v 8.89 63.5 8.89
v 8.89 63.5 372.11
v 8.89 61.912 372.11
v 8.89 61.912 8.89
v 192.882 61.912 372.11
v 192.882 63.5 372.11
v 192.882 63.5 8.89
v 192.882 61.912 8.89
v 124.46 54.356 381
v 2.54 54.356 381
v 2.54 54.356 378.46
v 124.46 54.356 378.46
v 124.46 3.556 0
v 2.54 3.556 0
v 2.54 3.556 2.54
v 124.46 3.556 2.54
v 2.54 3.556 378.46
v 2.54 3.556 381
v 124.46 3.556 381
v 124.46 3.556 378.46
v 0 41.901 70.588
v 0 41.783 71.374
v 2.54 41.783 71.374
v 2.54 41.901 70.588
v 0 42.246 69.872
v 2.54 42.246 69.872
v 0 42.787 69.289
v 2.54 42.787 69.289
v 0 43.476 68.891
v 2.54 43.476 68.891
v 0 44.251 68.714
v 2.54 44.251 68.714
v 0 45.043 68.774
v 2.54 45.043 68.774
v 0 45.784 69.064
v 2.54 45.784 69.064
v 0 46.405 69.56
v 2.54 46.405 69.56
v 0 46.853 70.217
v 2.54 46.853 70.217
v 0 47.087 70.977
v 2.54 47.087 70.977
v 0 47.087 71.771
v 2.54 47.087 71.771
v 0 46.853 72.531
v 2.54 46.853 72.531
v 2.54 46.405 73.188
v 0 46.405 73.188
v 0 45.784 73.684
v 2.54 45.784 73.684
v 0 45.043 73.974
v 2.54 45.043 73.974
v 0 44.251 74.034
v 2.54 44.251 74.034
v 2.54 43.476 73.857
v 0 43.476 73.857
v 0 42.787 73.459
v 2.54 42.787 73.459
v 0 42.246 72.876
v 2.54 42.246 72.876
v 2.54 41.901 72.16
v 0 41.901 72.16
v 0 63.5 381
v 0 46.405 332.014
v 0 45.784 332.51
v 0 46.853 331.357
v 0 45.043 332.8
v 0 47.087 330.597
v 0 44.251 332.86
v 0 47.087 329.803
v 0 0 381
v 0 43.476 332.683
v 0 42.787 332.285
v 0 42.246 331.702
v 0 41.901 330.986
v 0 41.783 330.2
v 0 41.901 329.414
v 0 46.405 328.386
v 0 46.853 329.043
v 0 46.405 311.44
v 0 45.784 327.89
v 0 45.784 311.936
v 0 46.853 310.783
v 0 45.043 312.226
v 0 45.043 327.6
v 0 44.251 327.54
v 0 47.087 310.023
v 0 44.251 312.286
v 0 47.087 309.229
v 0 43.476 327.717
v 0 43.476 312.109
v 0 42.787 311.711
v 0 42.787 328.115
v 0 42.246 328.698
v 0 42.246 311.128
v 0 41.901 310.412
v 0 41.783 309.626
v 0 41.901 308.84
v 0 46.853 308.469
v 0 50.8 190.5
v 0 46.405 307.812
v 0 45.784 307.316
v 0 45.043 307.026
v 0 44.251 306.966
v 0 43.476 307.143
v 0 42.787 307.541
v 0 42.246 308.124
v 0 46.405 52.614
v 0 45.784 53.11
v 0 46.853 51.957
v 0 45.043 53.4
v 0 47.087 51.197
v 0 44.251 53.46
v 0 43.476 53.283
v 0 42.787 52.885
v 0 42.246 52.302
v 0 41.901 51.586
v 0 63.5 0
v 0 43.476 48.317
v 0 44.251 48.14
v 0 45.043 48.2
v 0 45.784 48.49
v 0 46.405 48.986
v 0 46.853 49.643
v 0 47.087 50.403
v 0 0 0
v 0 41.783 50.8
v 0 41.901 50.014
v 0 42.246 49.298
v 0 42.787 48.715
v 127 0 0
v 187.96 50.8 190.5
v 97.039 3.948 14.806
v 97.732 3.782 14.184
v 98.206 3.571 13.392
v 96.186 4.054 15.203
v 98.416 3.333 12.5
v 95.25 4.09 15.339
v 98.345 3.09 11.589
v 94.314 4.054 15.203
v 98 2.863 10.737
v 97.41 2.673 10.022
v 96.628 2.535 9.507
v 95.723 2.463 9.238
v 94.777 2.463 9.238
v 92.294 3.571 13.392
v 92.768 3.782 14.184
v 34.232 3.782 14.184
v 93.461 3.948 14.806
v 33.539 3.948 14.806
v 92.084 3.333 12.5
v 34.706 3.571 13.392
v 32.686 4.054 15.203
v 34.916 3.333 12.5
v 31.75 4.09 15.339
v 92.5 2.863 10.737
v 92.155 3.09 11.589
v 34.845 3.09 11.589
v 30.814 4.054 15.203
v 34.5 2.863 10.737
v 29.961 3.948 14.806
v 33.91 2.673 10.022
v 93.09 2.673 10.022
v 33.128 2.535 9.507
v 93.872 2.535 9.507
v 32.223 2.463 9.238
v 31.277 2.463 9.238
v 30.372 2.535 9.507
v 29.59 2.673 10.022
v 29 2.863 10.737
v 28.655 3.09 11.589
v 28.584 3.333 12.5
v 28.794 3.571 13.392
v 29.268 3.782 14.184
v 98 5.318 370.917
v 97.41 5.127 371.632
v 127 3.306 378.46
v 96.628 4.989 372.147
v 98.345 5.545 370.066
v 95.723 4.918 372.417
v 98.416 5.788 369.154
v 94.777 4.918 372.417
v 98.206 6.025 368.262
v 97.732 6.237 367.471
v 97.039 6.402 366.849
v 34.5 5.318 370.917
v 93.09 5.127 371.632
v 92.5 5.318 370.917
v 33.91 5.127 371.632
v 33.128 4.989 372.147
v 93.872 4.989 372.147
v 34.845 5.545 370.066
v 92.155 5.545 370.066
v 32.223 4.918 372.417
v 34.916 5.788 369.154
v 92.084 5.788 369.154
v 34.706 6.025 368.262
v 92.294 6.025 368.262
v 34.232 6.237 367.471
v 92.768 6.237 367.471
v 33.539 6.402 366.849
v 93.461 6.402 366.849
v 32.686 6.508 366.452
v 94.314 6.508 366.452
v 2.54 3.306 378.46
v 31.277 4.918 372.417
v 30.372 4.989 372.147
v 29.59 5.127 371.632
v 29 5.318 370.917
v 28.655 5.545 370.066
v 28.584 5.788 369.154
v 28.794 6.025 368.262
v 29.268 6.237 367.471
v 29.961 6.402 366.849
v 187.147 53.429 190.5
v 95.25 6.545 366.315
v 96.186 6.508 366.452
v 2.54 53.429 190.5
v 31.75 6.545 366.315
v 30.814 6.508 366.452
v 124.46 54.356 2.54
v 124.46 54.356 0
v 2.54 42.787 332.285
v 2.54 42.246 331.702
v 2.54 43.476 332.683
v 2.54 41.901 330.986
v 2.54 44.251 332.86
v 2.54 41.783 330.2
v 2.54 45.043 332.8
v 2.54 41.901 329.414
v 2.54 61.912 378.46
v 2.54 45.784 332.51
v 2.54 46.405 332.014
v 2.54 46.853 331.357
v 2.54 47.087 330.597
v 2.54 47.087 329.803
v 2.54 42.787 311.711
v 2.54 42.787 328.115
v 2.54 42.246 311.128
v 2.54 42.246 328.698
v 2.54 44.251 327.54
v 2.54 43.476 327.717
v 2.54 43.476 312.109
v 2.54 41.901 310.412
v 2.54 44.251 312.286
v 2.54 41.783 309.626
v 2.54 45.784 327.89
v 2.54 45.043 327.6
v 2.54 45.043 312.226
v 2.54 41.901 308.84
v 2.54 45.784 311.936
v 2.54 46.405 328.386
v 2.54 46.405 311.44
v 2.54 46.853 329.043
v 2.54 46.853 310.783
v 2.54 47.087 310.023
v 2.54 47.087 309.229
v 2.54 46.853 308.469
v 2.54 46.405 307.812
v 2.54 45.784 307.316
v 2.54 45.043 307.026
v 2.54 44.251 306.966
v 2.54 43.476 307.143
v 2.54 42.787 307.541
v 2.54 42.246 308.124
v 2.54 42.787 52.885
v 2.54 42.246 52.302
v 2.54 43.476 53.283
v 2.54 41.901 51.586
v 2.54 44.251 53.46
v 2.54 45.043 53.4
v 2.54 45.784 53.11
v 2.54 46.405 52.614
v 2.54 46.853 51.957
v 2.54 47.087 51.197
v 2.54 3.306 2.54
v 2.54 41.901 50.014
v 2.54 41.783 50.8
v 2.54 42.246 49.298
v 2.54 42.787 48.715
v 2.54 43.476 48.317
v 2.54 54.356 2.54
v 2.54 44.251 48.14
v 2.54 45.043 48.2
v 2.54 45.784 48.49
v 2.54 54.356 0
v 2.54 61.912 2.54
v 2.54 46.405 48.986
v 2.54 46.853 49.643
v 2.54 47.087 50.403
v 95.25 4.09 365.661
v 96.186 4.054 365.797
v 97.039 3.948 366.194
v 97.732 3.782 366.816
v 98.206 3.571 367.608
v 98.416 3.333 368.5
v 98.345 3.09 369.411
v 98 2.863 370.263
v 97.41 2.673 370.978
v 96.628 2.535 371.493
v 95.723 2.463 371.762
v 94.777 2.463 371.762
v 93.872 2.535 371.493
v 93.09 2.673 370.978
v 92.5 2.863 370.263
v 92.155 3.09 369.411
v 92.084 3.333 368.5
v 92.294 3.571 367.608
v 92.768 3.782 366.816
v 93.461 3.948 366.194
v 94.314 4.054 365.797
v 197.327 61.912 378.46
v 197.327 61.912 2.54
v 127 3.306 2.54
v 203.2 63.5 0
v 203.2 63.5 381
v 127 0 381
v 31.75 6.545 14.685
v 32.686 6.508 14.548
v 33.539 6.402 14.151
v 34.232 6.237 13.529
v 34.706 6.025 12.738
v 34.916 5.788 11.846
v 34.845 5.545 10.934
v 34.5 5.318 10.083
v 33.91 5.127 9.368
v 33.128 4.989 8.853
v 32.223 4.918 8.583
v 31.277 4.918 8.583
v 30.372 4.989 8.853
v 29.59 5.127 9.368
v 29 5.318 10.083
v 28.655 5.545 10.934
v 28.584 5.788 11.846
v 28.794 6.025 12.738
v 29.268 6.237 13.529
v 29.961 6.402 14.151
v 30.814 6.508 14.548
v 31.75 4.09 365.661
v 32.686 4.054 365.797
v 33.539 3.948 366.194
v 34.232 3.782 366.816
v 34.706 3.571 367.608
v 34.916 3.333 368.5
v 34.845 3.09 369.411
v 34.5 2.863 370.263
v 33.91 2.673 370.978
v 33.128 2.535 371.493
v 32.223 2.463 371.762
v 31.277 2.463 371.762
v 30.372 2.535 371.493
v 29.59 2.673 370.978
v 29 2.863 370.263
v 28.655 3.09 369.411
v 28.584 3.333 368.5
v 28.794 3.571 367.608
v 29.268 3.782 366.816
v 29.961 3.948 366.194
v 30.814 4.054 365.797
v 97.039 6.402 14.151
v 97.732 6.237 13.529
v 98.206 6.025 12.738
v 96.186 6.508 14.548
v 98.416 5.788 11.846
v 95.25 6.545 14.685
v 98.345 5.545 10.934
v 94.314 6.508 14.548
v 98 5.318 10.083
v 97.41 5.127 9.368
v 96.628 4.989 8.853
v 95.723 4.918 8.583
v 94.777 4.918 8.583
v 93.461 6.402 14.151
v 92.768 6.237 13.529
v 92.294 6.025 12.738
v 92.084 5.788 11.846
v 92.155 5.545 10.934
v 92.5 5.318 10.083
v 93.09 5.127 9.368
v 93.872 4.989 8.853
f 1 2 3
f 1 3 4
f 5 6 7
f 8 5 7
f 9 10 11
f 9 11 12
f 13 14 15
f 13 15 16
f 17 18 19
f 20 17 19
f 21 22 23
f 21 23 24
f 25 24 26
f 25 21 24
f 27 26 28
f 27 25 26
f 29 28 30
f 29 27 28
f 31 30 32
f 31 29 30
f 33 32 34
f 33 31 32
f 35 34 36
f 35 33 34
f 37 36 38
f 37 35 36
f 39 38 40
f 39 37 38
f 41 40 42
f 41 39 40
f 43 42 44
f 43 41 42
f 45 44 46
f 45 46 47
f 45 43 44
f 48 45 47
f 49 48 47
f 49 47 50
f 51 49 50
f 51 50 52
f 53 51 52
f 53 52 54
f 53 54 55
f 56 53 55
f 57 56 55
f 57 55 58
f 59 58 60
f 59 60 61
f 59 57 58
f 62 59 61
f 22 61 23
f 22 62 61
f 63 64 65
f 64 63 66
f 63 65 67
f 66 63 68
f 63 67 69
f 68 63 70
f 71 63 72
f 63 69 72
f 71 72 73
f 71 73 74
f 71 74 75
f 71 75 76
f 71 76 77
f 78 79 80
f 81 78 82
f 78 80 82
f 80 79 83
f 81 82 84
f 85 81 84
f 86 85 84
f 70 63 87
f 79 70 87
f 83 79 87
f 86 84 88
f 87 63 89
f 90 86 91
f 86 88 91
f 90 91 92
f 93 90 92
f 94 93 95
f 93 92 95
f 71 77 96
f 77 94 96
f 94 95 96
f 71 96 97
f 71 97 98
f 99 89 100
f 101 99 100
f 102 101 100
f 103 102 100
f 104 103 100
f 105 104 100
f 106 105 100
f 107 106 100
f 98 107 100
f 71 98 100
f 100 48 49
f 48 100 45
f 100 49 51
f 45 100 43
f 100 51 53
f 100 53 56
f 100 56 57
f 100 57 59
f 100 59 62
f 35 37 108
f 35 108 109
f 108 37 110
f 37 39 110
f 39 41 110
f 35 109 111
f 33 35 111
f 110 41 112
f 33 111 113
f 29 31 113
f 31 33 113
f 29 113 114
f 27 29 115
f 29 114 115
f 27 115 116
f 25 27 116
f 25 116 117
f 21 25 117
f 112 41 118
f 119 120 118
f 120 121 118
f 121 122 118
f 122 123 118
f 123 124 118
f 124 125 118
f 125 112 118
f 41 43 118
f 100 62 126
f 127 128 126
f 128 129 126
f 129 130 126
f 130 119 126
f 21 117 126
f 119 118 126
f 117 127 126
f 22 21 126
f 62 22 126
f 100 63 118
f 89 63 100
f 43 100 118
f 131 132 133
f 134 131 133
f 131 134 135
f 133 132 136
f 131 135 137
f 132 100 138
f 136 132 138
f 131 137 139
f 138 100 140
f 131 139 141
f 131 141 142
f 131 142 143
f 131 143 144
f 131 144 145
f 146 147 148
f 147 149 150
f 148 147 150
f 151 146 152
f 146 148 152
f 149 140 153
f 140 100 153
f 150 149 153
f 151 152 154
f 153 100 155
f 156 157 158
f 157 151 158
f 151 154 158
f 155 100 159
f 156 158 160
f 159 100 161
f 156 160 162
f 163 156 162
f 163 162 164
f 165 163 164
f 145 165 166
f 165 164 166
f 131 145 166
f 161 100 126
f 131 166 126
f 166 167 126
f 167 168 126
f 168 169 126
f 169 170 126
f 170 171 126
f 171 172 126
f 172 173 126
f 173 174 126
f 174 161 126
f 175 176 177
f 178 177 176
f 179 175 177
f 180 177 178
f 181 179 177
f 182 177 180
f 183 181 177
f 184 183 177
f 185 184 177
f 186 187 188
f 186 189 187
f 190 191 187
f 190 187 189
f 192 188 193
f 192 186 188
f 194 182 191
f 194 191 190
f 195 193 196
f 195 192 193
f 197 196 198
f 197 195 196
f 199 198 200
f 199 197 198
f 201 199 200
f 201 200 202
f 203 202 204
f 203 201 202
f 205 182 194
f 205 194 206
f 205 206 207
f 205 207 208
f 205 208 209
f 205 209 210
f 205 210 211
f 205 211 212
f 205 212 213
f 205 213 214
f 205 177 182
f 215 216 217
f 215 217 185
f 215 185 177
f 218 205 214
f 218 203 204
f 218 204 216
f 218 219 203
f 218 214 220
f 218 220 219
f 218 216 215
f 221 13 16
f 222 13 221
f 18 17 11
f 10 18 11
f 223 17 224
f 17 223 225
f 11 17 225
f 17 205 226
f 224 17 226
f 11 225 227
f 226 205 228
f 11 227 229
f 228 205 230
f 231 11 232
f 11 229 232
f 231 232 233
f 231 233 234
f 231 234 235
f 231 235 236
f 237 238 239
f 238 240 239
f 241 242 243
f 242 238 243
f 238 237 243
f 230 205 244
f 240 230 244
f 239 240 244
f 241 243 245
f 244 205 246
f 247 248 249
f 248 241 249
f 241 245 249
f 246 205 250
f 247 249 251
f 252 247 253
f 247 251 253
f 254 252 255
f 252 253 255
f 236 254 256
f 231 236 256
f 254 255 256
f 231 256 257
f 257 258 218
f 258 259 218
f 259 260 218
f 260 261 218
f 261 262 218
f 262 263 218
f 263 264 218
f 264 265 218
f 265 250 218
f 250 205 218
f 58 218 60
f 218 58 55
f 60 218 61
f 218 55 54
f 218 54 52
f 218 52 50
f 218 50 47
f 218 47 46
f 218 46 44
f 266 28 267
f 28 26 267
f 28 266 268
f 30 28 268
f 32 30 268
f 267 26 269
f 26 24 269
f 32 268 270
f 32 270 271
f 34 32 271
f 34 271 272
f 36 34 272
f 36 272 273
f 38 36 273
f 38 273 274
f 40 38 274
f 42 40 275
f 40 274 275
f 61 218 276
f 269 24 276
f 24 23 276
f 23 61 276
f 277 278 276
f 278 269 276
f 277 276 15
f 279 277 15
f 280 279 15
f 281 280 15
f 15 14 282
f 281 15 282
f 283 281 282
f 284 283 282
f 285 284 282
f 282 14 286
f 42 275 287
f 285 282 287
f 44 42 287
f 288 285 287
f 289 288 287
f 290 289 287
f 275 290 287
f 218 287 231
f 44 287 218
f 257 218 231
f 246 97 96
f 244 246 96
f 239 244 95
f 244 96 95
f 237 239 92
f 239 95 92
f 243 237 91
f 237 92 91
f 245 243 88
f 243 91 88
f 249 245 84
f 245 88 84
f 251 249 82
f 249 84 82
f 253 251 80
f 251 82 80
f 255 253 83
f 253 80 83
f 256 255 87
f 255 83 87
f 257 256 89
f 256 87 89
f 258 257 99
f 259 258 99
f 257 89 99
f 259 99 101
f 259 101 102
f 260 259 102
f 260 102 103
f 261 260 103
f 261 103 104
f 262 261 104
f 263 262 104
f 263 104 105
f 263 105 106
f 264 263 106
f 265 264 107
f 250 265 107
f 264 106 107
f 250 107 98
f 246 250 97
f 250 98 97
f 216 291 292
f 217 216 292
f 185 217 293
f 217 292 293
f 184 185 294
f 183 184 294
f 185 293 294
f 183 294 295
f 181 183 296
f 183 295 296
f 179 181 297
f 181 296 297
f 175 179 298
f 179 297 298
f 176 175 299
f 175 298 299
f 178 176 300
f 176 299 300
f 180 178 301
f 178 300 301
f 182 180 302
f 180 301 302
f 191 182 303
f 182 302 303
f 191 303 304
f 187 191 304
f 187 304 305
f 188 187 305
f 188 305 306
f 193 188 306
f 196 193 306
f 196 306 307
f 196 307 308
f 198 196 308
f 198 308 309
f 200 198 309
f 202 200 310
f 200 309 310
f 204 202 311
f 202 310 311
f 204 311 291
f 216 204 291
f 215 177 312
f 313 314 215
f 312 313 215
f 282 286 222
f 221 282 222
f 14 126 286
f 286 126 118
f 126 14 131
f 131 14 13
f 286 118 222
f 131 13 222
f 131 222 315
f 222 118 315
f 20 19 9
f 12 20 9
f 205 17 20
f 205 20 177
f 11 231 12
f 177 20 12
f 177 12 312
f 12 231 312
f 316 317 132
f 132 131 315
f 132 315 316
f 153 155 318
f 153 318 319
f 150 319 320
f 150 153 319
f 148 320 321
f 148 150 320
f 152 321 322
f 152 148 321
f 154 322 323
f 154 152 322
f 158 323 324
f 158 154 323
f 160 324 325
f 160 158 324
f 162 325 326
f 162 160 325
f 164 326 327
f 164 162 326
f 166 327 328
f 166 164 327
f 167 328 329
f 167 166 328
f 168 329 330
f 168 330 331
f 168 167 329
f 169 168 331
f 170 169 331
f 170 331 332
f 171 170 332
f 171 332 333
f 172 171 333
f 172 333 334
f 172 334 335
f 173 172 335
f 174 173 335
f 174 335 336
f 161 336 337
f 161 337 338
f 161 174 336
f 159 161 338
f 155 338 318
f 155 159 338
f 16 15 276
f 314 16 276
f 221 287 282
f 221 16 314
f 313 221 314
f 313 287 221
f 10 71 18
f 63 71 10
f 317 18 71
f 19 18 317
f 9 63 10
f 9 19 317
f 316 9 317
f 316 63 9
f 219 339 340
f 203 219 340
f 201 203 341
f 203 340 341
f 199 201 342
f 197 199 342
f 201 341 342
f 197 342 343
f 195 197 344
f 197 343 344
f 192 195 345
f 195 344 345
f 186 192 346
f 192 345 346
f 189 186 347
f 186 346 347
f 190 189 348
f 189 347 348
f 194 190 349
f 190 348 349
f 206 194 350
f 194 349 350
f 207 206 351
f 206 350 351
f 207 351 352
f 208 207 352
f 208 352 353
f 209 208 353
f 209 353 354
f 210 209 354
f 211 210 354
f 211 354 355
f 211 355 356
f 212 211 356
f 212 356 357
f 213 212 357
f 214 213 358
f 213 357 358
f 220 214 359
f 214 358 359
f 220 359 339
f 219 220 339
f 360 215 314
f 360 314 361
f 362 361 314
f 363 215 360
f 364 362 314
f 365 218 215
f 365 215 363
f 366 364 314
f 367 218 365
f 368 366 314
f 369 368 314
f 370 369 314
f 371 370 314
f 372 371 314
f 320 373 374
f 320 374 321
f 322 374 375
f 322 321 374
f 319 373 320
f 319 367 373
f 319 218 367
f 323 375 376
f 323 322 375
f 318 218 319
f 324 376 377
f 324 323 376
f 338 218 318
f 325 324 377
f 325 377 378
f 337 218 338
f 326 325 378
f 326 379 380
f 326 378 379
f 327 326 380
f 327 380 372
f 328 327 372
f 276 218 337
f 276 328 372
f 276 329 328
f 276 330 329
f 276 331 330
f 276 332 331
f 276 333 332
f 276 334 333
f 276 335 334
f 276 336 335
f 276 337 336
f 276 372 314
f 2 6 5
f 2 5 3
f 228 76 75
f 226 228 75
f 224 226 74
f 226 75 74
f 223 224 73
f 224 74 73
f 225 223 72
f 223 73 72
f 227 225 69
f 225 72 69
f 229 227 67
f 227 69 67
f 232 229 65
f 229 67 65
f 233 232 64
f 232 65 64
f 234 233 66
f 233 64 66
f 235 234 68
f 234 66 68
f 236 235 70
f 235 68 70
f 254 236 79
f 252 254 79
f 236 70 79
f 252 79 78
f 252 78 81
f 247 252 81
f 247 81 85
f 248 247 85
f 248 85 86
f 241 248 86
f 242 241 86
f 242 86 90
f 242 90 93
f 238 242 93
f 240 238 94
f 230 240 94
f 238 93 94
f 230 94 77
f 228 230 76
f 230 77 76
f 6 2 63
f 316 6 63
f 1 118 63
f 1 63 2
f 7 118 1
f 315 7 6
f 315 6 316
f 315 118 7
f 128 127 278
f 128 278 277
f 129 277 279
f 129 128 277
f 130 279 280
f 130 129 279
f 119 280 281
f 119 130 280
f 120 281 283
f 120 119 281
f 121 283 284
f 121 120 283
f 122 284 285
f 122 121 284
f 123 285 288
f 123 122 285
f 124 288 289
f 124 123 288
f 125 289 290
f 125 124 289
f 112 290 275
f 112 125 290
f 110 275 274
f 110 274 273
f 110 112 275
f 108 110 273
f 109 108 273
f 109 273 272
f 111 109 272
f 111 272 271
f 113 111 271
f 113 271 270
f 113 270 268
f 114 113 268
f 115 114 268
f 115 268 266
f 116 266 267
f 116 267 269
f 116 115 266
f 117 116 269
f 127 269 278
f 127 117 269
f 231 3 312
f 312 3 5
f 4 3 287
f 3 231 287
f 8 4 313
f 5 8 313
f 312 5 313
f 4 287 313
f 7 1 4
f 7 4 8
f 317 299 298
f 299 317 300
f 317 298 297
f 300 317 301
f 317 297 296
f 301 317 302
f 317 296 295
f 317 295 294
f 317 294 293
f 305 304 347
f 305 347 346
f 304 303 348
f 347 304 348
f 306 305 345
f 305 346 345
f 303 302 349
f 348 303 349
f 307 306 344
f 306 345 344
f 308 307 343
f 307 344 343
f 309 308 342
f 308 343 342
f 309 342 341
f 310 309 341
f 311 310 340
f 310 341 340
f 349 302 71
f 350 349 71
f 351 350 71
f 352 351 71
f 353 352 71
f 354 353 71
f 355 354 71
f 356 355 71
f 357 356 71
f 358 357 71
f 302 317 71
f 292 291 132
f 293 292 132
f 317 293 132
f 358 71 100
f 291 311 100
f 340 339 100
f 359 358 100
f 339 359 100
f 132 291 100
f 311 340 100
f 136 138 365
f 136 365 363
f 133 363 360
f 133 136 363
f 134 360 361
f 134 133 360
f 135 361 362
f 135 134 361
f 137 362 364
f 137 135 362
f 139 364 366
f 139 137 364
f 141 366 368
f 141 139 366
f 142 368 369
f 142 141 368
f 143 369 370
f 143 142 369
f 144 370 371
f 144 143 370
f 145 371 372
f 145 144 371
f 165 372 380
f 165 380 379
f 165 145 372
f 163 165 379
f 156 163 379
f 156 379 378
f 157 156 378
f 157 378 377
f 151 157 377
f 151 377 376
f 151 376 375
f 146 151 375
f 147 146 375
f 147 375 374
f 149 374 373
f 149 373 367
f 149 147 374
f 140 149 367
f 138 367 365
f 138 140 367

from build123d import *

# Parameters (mm, degrees)
BOSS_EXTRUDE1_DEPTH = 381
CUT_EXTRUDE1_DEPTH  = 304.8
SHELL1_T            = -2.54
SKETCH4_W           = 121.92
SKETCH4_H           = 50.8
CUT_EXTRUDE3_DEPTH  = 2.54
CUT_EXTRUDE4_START  = -381
SKETCH4_4_W         = 121.92
SKETCH4_4_H         = 50.8
CUT_EXTRUDE4_DEPTH  = 2.54
SKETCH5_R           = 3.175
CUT_EXTRUDE5_DEPTH  = 2.54
BOSS_EXTRUDE2_START = 63.5
SKETCH7_W           = 196.692393165
SKETCH7_H           = 375.92
BOSS_EXTRUDE2_DEPTH = 1.5875
SKETCH8_R           = 2.667
CUT_EXTRUDE6_DEPTH  = 2.54


with BuildPart() as part:
    # Sketch2 → Boss-Extrude1 (new body)
    with BuildSketch(Plane.XY):
        Polygon((0, 0), (127, 0), (203.2, 63.5), (0, 63.5), align=None)
    extrude(amount=BOSS_EXTRUDE1_DEPTH)

    # Sketch3 → Cut-Extrude1 (cut)
    with BuildSketch(Plane.ZY):
        Polygon((0, 0), (381, 0), (190.5, 50.8), align=None)
    extrude(amount=-CUT_EXTRUDE1_DEPTH, mode=Mode.SUBTRACT)

    # Shell1
    shell1_openings = [part.faces().sort_by_distance(p)[0] for p in [
        (101.6, 63.5, 190.5),
    ]]
    offset(amount=SHELL1_T, openings=shell1_openings, kind=Kind.INTERSECTION)

    # Sketch4 → Cut-Extrude3 (cut)
    with BuildSketch(Plane.XY.offset(381)):
        with Locations((63.5, 28.956)):
            Rectangle(SKETCH4_W, SKETCH4_H)
    extrude(amount=-CUT_EXTRUDE3_DEPTH, mode=Mode.SUBTRACT)

    # Sketch4<4> → Cut-Extrude4 (cut)
    with BuildSketch(Plane.XY.offset(381).offset(CUT_EXTRUDE4_START)):
        with Locations((63.5, 28.956)):
            Rectangle(SKETCH4_4_W, SKETCH4_4_H)
    extrude(amount=CUT_EXTRUDE4_DEPTH, mode=Mode.SUBTRACT)

    # Sketch5 → Cut-Extrude5 (cut)
    with BuildSketch(Plane(origin=(0, 94.854771784, 25.294605809), x_dir=(1, 0, 0), z_dir=(0, -0.9662349396012463, -0.2576626505603321))):
        with Locations(Location((31.75, 355.435511988, 0), (0, 0, 270))):
            Circle(SKETCH5_R)
        with Locations(Location((95.25, 355.435511988, 0), (0, 0, 270))):
            Circle(SKETCH5_R)
    cut_extrude5 = extrude(amount=-CUT_EXTRUDE5_DEPTH, mode=Mode.SUBTRACT)

    # Mirror1: Cut-Extrude5 across plane
    add(cut_extrude5.mirror(Plane.XY.offset(190.5)), mode=Mode.SUBTRACT)

    # Sketch7 → Boss-Extrude2 (add)
    with BuildSketch(Plane(origin=(0, 0, 0), x_dir=(1, 0, 0), z_dir=(0, 1, 0)).offset(BOSS_EXTRUDE2_START)):
        with Locations((100.886196583, -190.5)):
            Rectangle(SKETCH7_W, SKETCH7_H)
        Polygon((8.89, -372.11), (126.999705463, -372.11), (192.882393165, -372.11), (192.882393165, -8.89), (126.999705463, -8.89), (8.89, -8.89), (8.89, -190.5), align=None, mode=Mode.SUBTRACT)
    extrude(amount=-BOSS_EXTRUDE2_DEPTH)

    # Sketch8 → Cut-Extrude6 (cut)
    with BuildSketch(Plane.ZY):
        with Locations(Location((309.626, 44.45, 0), (0, 0, 270))):
            Circle(SKETCH8_R)
        with Locations(Location((330.2, 44.45, 0), (0, 0, 270))):
            Circle(SKETCH8_R)
    cut_extrude6 = extrude(amount=-CUT_EXTRUDE6_DEPTH, mode=Mode.SUBTRACT)

    # Mirror2: Cut-Extrude6 across plane
    add(cut_extrude6.mirror(Plane.XY.offset(190.5)), mode=Mode.SUBTRACT)


solid = part.part
